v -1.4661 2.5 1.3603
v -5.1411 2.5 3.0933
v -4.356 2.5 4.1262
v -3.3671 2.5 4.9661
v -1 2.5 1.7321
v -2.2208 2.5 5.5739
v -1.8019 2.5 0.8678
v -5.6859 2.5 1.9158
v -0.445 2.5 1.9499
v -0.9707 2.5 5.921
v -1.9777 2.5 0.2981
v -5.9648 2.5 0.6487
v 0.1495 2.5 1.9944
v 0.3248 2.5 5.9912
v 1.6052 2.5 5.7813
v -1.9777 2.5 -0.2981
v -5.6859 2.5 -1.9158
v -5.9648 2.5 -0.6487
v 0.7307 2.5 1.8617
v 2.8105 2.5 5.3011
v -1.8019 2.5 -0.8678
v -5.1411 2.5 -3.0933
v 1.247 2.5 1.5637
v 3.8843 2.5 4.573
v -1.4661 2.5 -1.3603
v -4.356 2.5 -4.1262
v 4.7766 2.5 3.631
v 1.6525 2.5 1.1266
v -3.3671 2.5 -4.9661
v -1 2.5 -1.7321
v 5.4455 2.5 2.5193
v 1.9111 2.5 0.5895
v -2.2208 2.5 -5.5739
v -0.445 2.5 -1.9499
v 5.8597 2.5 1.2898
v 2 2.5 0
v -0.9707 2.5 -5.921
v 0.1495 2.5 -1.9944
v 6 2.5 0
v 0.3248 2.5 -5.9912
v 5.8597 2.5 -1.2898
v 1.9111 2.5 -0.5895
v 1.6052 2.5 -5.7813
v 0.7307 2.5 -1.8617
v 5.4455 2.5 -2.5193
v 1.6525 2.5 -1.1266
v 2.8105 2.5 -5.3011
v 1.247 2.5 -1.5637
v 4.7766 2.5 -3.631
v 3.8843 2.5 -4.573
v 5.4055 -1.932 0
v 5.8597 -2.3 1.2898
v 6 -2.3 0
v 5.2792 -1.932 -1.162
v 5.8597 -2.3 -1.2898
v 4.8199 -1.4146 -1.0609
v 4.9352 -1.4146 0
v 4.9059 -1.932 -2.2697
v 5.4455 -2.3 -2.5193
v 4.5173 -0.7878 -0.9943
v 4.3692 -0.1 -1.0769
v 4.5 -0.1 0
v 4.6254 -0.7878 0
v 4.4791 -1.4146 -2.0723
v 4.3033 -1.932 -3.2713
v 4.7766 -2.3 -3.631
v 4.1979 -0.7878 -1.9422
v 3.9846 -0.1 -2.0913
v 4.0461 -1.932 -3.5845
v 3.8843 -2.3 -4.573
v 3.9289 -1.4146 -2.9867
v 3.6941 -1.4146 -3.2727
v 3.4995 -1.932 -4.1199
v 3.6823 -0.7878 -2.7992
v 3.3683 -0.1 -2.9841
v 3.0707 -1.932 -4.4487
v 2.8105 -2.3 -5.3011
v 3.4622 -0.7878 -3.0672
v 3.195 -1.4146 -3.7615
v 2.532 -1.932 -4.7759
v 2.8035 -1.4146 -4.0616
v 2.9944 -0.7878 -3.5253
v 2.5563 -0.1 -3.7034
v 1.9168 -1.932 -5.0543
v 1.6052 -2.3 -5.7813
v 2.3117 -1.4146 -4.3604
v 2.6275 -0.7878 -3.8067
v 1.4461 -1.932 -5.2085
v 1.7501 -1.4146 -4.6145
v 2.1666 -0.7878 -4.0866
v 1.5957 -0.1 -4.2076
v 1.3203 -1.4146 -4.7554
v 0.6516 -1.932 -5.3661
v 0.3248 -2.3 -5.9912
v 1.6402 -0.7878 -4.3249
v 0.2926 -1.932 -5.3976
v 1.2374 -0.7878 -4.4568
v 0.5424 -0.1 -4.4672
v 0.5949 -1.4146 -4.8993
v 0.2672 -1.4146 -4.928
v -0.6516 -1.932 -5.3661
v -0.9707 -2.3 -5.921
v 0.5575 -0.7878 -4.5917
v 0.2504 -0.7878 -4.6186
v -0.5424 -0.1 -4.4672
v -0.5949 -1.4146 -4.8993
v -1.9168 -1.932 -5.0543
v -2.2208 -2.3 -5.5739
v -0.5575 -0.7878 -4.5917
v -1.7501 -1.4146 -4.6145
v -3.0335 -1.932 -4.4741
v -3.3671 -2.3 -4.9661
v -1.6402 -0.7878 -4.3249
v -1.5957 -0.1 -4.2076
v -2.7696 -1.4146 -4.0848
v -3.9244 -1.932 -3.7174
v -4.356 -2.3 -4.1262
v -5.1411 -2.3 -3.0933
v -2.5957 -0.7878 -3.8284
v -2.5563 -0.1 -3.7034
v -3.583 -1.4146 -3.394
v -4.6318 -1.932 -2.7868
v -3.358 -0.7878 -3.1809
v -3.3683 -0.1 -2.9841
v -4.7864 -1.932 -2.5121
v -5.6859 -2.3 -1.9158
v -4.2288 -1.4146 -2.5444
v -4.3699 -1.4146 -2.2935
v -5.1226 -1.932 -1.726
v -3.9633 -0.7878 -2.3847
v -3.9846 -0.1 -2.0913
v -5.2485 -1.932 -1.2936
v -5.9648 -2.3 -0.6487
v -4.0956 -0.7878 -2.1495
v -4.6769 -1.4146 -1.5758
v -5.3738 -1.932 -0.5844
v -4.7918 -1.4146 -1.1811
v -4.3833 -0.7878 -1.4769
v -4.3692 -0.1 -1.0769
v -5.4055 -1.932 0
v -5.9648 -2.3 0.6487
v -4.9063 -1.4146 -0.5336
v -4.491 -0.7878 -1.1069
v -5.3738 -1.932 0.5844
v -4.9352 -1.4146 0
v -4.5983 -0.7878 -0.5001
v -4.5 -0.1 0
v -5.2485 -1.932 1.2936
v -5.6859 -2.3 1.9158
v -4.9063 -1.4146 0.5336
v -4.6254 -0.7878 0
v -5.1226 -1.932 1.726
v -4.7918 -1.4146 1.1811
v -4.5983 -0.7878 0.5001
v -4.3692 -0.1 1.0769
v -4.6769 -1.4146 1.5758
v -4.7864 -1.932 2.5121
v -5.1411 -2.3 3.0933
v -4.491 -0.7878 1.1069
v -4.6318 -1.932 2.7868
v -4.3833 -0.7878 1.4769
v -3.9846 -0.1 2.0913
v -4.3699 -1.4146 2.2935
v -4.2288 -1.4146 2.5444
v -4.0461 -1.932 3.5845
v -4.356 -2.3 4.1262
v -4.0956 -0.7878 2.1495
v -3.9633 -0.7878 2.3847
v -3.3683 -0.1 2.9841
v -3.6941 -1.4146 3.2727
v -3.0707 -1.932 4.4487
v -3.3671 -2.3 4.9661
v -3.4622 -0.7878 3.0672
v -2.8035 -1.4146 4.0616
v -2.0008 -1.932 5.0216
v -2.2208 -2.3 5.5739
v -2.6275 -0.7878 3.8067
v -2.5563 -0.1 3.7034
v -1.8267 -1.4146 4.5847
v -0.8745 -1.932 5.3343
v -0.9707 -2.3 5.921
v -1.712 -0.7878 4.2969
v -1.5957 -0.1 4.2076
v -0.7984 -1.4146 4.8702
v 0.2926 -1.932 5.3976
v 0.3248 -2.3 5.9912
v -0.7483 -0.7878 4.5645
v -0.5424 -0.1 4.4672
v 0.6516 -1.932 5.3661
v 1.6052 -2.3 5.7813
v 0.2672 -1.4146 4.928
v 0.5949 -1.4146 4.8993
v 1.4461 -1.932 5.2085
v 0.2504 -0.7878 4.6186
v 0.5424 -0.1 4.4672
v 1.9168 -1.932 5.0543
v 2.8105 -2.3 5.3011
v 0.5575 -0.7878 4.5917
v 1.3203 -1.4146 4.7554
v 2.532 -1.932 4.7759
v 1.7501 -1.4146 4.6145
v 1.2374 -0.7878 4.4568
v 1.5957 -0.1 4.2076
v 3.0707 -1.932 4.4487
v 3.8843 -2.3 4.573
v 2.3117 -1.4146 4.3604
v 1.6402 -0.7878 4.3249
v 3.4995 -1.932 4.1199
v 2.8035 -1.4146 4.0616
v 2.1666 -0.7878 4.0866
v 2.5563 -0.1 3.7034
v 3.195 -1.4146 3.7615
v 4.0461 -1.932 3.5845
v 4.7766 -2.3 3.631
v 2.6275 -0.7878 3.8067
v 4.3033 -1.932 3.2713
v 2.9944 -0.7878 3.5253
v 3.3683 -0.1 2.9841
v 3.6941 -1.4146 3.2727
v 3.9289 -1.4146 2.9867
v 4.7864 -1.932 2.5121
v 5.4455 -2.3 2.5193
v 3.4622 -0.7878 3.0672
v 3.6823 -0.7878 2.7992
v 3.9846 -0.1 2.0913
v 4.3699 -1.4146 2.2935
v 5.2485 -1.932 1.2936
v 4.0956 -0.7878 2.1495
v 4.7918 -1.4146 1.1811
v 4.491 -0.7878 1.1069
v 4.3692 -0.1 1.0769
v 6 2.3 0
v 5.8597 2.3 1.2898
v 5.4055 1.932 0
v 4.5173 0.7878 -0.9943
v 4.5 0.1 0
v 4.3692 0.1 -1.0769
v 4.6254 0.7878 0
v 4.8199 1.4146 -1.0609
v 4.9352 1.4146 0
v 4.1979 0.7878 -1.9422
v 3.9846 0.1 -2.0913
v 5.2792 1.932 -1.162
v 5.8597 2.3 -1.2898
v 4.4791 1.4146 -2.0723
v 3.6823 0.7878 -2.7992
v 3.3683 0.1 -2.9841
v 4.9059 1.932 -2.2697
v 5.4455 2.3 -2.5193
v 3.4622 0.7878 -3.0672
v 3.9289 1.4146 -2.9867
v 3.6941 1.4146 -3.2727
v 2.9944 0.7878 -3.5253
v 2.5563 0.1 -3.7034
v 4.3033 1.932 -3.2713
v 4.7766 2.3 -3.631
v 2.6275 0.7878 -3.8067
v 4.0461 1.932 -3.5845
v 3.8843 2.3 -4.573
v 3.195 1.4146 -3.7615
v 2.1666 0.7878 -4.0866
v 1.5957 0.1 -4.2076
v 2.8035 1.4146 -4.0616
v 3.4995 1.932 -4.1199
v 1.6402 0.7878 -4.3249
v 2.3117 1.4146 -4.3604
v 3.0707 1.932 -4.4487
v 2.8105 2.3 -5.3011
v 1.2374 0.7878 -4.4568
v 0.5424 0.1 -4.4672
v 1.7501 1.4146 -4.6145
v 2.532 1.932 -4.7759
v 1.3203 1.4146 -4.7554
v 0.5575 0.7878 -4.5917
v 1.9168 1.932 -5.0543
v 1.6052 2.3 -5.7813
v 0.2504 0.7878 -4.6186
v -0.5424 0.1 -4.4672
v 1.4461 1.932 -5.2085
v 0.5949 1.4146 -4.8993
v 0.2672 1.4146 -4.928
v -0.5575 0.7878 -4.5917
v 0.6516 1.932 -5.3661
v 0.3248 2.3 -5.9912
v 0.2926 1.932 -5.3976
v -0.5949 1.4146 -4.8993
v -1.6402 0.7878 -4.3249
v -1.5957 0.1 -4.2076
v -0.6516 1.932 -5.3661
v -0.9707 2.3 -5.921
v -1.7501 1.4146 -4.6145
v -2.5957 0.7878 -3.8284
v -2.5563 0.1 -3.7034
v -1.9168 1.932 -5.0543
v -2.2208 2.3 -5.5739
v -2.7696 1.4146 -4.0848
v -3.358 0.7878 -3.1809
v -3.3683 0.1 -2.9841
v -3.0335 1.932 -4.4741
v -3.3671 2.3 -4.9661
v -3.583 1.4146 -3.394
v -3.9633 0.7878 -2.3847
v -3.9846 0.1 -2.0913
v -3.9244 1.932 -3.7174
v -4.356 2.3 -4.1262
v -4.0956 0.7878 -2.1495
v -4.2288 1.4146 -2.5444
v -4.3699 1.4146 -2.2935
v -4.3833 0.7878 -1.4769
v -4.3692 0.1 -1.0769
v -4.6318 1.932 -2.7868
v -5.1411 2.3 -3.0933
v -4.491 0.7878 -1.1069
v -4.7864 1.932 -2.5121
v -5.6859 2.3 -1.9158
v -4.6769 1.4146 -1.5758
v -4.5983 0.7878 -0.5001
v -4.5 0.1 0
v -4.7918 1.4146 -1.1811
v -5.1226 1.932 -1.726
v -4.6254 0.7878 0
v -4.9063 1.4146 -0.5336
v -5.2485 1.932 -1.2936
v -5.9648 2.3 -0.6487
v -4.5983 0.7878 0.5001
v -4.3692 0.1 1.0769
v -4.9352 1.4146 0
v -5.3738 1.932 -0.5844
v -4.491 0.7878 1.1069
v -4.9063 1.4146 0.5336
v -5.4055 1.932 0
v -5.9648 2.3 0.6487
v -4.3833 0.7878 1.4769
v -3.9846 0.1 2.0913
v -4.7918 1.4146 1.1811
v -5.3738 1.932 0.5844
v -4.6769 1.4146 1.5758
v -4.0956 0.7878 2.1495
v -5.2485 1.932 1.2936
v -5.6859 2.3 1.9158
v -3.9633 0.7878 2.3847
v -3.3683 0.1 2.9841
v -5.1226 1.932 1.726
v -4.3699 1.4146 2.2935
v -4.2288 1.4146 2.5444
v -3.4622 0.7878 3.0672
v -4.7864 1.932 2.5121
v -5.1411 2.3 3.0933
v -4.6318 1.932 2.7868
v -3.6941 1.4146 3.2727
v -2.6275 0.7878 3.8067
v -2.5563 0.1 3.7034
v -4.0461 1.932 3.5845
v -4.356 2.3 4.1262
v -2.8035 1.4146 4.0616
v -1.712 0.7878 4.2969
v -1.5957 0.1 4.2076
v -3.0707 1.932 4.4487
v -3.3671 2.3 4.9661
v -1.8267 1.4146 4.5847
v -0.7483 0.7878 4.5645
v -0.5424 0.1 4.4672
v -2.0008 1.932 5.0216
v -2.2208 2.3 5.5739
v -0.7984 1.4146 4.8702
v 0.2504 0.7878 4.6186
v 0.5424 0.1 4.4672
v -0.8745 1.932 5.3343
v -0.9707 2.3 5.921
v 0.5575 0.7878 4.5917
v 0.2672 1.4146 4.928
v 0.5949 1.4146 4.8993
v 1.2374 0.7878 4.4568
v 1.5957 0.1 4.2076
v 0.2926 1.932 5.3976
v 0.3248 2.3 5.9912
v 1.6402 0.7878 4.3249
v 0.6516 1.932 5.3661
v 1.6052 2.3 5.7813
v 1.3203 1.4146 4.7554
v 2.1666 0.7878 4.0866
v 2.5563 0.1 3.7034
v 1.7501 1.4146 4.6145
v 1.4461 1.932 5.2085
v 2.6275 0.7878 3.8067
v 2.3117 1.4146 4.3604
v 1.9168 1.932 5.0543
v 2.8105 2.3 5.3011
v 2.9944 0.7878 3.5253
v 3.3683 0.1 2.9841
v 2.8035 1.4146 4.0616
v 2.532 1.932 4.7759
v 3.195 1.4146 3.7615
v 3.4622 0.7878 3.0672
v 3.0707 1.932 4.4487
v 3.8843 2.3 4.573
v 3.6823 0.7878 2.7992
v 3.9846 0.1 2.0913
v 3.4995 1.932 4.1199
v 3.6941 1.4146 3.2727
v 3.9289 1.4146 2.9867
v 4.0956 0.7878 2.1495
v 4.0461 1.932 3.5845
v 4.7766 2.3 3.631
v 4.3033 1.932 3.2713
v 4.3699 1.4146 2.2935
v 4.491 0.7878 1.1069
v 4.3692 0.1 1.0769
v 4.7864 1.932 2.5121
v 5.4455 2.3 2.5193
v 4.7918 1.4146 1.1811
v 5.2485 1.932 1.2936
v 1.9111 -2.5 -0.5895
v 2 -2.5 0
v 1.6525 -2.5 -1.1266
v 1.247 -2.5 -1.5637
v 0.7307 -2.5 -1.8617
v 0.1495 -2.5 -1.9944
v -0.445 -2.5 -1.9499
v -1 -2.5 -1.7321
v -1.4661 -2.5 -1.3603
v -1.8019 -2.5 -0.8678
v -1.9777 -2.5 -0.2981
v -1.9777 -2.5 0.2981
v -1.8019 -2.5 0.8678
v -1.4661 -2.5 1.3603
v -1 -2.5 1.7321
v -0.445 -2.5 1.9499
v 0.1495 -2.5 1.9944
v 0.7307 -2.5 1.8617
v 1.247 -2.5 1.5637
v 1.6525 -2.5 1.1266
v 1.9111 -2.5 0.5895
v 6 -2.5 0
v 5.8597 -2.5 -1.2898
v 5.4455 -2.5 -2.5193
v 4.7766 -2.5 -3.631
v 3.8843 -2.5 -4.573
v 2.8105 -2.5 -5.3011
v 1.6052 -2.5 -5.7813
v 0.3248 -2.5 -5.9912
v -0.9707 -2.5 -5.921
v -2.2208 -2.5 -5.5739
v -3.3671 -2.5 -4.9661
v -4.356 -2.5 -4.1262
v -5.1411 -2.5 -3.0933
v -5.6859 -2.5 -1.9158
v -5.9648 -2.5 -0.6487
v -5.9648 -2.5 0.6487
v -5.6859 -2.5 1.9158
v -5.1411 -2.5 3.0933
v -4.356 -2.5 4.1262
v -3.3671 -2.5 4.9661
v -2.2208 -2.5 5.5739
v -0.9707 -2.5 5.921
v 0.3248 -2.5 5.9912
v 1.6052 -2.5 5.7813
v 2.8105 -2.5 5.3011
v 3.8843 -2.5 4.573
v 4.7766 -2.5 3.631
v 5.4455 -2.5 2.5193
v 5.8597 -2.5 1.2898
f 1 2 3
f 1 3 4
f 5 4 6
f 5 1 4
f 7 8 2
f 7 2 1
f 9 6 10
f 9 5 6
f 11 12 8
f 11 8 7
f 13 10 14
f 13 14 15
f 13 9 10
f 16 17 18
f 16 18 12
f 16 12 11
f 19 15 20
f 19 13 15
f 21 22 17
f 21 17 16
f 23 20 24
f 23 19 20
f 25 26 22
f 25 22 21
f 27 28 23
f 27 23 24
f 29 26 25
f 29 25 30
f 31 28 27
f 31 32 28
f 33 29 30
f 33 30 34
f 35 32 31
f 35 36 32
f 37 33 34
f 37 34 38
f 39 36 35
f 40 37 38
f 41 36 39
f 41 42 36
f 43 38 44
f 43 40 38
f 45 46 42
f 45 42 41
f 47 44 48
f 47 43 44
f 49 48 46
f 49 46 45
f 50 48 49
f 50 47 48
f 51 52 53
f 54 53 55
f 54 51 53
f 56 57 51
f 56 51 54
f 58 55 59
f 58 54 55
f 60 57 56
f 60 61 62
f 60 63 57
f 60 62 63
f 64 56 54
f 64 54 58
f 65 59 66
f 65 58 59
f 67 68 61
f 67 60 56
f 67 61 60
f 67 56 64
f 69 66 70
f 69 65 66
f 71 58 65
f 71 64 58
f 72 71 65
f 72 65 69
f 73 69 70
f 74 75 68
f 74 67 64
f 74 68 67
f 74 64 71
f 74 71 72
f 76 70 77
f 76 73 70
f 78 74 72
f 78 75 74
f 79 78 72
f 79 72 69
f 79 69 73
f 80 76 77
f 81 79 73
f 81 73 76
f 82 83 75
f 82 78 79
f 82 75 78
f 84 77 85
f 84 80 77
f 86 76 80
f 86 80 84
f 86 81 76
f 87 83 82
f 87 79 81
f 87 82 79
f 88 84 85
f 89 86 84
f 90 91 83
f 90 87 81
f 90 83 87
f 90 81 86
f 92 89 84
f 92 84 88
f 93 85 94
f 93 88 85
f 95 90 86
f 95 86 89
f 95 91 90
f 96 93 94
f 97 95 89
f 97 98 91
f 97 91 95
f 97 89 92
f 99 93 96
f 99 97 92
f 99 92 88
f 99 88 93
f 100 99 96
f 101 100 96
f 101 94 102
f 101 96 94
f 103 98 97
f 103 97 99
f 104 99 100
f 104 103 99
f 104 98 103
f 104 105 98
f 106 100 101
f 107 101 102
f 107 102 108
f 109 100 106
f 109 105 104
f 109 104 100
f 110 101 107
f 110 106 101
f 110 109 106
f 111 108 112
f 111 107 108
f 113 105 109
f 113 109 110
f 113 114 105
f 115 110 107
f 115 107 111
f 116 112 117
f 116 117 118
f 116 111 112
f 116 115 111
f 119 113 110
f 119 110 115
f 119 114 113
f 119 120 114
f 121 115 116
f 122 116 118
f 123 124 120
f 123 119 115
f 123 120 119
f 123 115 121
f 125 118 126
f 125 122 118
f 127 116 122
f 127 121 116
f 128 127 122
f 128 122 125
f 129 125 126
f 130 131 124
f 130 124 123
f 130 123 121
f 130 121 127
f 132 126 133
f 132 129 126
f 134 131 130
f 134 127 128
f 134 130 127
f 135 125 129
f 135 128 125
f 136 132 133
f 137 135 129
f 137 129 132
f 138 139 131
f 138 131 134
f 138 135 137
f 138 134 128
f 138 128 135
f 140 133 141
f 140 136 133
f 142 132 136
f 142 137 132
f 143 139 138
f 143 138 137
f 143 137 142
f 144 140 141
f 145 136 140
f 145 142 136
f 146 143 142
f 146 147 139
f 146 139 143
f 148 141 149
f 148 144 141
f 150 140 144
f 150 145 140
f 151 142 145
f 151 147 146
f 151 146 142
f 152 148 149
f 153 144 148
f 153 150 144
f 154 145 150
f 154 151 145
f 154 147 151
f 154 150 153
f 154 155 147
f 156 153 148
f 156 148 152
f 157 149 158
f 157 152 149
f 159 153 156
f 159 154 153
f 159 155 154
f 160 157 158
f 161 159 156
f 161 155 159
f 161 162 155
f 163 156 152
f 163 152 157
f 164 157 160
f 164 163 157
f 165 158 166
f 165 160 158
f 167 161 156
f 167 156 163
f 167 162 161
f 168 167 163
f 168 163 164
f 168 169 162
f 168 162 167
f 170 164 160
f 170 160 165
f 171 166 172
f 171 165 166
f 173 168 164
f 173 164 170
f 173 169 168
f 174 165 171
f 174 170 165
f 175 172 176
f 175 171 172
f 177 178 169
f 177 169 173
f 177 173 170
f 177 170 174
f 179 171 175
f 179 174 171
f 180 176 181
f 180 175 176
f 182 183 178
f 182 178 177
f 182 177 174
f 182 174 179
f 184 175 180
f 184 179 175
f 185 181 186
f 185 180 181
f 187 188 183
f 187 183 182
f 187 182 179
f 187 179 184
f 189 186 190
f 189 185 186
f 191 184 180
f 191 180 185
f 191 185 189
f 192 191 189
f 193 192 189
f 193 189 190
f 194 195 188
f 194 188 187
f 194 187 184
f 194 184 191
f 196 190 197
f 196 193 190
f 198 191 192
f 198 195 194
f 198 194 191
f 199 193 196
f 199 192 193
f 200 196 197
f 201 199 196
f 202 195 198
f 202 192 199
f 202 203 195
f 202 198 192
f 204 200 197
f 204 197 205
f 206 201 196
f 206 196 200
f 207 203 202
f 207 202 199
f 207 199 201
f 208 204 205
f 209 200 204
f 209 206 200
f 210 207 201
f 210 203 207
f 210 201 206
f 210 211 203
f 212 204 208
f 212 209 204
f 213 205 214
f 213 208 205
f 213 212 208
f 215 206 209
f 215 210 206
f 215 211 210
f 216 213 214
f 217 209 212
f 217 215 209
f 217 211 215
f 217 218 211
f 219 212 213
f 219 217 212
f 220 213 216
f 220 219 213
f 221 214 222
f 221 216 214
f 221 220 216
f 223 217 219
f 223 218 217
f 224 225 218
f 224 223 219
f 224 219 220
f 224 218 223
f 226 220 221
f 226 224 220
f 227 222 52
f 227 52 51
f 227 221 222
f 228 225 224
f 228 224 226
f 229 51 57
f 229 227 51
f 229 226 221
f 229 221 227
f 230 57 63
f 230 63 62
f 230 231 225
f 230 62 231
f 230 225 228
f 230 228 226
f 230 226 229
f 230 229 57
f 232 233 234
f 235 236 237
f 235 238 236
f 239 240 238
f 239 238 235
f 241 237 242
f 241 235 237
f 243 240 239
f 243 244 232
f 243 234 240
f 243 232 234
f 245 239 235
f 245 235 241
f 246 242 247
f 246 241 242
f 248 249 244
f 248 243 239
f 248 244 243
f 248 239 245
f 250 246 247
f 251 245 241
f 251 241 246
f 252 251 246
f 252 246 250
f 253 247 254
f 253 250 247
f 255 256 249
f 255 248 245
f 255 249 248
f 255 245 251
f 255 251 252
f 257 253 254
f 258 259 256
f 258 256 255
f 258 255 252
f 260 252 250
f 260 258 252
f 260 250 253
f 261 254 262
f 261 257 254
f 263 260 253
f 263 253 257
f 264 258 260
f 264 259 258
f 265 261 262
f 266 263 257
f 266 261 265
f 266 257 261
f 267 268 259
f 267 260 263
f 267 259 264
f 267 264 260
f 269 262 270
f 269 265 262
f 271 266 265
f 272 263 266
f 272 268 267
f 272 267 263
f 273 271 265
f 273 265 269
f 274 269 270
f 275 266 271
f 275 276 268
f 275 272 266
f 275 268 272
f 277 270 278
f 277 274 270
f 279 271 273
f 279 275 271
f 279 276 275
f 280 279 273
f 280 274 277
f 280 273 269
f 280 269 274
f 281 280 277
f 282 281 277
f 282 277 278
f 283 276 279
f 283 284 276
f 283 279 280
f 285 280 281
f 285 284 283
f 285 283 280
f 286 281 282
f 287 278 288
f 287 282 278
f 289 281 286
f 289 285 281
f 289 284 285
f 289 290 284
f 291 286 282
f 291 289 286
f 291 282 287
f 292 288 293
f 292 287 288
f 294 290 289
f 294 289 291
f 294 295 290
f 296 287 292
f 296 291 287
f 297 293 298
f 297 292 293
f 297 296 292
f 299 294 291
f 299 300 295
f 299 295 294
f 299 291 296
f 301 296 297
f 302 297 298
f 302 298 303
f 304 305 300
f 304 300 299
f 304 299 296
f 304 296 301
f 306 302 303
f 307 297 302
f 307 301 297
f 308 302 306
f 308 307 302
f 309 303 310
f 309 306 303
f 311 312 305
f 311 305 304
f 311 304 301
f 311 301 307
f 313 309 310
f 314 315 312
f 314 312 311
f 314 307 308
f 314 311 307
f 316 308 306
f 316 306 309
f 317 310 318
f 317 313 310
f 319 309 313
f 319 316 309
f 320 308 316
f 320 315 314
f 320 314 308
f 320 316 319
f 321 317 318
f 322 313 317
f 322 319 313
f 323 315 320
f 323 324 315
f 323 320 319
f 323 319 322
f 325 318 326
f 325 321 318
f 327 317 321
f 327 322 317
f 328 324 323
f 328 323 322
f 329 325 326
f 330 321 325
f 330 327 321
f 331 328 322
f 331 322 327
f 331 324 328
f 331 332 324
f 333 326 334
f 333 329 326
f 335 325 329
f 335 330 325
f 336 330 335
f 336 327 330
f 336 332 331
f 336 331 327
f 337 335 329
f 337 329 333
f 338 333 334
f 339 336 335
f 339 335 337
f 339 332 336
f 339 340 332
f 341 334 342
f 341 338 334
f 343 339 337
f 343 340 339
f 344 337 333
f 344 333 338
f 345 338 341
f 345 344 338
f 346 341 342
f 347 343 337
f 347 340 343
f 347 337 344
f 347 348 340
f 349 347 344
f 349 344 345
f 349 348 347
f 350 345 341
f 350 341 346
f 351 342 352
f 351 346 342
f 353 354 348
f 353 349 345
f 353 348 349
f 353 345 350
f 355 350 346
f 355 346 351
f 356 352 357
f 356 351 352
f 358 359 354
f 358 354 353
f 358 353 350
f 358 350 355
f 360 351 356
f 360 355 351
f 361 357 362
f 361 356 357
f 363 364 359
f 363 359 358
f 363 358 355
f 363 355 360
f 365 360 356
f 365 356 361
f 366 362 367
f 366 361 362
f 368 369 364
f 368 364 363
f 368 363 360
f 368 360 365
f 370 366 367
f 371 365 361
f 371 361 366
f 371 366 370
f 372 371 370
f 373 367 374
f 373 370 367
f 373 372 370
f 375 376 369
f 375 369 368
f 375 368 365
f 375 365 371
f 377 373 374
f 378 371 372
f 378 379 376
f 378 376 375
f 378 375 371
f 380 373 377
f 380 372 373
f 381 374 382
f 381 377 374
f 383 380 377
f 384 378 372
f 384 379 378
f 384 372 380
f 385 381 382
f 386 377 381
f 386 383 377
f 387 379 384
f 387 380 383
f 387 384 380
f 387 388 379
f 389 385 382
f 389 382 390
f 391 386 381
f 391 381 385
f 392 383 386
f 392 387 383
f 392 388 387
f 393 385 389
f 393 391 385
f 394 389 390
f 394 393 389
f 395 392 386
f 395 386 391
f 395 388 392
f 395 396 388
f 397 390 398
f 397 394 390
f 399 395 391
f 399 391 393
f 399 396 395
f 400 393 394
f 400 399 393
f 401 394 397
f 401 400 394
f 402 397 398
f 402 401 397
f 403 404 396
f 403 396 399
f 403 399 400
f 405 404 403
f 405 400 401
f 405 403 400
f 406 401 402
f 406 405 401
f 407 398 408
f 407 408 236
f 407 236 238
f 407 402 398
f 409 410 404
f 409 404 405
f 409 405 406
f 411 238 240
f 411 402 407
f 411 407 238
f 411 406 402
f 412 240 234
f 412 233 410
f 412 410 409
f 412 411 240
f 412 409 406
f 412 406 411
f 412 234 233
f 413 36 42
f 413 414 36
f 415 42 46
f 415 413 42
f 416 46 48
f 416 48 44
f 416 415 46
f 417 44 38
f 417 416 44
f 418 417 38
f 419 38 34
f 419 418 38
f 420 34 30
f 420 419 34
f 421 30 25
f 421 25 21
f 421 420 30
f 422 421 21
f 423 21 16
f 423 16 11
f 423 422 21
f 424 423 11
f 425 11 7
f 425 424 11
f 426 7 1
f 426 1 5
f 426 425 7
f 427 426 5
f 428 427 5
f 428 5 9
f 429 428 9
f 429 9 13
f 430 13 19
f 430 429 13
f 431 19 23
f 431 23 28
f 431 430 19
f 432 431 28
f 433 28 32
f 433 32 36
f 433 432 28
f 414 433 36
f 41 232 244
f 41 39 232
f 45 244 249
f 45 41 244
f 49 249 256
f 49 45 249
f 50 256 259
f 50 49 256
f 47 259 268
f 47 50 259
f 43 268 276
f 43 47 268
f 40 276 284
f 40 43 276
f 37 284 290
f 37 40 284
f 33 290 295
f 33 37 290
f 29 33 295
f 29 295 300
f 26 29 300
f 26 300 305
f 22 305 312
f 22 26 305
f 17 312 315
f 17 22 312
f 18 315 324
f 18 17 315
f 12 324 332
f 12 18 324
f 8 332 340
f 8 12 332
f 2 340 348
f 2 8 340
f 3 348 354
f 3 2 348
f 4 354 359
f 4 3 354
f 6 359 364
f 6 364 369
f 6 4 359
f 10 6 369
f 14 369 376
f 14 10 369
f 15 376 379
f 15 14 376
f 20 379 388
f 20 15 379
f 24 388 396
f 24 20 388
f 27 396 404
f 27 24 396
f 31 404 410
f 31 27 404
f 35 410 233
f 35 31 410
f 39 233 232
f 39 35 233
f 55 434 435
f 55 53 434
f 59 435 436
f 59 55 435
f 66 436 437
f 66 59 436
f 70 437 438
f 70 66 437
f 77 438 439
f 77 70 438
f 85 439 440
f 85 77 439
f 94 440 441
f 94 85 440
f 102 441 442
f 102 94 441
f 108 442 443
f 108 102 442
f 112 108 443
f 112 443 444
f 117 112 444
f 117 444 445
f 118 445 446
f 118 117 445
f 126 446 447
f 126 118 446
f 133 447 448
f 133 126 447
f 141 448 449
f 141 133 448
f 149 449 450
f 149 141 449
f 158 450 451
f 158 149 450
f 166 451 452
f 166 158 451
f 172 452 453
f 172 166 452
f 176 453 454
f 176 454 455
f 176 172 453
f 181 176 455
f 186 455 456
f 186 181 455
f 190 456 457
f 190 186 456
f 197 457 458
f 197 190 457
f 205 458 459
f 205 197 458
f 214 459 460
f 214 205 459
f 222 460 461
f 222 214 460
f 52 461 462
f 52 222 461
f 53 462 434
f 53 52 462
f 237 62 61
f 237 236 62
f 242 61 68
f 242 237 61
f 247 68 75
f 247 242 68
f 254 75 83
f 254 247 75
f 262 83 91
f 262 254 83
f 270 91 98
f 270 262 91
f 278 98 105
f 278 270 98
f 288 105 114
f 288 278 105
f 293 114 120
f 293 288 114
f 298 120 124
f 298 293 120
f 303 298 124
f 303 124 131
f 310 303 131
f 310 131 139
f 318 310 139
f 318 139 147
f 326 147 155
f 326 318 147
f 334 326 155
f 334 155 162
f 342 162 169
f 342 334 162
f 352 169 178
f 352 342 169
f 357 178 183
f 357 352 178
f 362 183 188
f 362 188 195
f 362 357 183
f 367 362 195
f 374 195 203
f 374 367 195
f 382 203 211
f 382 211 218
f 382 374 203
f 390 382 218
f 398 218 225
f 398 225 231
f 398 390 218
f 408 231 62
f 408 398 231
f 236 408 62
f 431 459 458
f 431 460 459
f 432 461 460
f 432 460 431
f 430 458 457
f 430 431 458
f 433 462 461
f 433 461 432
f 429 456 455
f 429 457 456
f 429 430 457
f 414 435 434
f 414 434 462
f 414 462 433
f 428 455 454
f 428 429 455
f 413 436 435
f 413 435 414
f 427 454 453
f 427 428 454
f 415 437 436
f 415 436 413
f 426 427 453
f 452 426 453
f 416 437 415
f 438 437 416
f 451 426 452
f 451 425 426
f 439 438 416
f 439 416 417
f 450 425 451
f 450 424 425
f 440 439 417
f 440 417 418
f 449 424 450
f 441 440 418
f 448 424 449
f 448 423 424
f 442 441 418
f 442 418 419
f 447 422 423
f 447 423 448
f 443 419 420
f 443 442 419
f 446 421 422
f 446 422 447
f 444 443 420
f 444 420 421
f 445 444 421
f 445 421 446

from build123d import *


with BuildPart() as part:
    # Sketch2 → Revolve1 (revolve)
    with BuildSketch(Plane.XY):
        with BuildLine():
            Line((2, 2.5), (2, -2.5))
            Line((2, -2.5), (6, -2.5))
            Line((6, -2.5), (6, -2.3))
            ThreePointArc((6, -2.3), (4.935246844, -1.414604424), (4.5, -0.1))
            Line((4.5, -0.1), (4.5, 0.1))
            ThreePointArc((4.5, 0.1), (4.935246844, 1.414604424), (6, 2.3))
            Line((6, 2.3), (6, 2.5))
            Line((6, 2.5), (2, 2.5))
        make_face()
    revolve(axis=Axis((0, -2.5, 0), (0, 1, 0)))


solid = part.part
